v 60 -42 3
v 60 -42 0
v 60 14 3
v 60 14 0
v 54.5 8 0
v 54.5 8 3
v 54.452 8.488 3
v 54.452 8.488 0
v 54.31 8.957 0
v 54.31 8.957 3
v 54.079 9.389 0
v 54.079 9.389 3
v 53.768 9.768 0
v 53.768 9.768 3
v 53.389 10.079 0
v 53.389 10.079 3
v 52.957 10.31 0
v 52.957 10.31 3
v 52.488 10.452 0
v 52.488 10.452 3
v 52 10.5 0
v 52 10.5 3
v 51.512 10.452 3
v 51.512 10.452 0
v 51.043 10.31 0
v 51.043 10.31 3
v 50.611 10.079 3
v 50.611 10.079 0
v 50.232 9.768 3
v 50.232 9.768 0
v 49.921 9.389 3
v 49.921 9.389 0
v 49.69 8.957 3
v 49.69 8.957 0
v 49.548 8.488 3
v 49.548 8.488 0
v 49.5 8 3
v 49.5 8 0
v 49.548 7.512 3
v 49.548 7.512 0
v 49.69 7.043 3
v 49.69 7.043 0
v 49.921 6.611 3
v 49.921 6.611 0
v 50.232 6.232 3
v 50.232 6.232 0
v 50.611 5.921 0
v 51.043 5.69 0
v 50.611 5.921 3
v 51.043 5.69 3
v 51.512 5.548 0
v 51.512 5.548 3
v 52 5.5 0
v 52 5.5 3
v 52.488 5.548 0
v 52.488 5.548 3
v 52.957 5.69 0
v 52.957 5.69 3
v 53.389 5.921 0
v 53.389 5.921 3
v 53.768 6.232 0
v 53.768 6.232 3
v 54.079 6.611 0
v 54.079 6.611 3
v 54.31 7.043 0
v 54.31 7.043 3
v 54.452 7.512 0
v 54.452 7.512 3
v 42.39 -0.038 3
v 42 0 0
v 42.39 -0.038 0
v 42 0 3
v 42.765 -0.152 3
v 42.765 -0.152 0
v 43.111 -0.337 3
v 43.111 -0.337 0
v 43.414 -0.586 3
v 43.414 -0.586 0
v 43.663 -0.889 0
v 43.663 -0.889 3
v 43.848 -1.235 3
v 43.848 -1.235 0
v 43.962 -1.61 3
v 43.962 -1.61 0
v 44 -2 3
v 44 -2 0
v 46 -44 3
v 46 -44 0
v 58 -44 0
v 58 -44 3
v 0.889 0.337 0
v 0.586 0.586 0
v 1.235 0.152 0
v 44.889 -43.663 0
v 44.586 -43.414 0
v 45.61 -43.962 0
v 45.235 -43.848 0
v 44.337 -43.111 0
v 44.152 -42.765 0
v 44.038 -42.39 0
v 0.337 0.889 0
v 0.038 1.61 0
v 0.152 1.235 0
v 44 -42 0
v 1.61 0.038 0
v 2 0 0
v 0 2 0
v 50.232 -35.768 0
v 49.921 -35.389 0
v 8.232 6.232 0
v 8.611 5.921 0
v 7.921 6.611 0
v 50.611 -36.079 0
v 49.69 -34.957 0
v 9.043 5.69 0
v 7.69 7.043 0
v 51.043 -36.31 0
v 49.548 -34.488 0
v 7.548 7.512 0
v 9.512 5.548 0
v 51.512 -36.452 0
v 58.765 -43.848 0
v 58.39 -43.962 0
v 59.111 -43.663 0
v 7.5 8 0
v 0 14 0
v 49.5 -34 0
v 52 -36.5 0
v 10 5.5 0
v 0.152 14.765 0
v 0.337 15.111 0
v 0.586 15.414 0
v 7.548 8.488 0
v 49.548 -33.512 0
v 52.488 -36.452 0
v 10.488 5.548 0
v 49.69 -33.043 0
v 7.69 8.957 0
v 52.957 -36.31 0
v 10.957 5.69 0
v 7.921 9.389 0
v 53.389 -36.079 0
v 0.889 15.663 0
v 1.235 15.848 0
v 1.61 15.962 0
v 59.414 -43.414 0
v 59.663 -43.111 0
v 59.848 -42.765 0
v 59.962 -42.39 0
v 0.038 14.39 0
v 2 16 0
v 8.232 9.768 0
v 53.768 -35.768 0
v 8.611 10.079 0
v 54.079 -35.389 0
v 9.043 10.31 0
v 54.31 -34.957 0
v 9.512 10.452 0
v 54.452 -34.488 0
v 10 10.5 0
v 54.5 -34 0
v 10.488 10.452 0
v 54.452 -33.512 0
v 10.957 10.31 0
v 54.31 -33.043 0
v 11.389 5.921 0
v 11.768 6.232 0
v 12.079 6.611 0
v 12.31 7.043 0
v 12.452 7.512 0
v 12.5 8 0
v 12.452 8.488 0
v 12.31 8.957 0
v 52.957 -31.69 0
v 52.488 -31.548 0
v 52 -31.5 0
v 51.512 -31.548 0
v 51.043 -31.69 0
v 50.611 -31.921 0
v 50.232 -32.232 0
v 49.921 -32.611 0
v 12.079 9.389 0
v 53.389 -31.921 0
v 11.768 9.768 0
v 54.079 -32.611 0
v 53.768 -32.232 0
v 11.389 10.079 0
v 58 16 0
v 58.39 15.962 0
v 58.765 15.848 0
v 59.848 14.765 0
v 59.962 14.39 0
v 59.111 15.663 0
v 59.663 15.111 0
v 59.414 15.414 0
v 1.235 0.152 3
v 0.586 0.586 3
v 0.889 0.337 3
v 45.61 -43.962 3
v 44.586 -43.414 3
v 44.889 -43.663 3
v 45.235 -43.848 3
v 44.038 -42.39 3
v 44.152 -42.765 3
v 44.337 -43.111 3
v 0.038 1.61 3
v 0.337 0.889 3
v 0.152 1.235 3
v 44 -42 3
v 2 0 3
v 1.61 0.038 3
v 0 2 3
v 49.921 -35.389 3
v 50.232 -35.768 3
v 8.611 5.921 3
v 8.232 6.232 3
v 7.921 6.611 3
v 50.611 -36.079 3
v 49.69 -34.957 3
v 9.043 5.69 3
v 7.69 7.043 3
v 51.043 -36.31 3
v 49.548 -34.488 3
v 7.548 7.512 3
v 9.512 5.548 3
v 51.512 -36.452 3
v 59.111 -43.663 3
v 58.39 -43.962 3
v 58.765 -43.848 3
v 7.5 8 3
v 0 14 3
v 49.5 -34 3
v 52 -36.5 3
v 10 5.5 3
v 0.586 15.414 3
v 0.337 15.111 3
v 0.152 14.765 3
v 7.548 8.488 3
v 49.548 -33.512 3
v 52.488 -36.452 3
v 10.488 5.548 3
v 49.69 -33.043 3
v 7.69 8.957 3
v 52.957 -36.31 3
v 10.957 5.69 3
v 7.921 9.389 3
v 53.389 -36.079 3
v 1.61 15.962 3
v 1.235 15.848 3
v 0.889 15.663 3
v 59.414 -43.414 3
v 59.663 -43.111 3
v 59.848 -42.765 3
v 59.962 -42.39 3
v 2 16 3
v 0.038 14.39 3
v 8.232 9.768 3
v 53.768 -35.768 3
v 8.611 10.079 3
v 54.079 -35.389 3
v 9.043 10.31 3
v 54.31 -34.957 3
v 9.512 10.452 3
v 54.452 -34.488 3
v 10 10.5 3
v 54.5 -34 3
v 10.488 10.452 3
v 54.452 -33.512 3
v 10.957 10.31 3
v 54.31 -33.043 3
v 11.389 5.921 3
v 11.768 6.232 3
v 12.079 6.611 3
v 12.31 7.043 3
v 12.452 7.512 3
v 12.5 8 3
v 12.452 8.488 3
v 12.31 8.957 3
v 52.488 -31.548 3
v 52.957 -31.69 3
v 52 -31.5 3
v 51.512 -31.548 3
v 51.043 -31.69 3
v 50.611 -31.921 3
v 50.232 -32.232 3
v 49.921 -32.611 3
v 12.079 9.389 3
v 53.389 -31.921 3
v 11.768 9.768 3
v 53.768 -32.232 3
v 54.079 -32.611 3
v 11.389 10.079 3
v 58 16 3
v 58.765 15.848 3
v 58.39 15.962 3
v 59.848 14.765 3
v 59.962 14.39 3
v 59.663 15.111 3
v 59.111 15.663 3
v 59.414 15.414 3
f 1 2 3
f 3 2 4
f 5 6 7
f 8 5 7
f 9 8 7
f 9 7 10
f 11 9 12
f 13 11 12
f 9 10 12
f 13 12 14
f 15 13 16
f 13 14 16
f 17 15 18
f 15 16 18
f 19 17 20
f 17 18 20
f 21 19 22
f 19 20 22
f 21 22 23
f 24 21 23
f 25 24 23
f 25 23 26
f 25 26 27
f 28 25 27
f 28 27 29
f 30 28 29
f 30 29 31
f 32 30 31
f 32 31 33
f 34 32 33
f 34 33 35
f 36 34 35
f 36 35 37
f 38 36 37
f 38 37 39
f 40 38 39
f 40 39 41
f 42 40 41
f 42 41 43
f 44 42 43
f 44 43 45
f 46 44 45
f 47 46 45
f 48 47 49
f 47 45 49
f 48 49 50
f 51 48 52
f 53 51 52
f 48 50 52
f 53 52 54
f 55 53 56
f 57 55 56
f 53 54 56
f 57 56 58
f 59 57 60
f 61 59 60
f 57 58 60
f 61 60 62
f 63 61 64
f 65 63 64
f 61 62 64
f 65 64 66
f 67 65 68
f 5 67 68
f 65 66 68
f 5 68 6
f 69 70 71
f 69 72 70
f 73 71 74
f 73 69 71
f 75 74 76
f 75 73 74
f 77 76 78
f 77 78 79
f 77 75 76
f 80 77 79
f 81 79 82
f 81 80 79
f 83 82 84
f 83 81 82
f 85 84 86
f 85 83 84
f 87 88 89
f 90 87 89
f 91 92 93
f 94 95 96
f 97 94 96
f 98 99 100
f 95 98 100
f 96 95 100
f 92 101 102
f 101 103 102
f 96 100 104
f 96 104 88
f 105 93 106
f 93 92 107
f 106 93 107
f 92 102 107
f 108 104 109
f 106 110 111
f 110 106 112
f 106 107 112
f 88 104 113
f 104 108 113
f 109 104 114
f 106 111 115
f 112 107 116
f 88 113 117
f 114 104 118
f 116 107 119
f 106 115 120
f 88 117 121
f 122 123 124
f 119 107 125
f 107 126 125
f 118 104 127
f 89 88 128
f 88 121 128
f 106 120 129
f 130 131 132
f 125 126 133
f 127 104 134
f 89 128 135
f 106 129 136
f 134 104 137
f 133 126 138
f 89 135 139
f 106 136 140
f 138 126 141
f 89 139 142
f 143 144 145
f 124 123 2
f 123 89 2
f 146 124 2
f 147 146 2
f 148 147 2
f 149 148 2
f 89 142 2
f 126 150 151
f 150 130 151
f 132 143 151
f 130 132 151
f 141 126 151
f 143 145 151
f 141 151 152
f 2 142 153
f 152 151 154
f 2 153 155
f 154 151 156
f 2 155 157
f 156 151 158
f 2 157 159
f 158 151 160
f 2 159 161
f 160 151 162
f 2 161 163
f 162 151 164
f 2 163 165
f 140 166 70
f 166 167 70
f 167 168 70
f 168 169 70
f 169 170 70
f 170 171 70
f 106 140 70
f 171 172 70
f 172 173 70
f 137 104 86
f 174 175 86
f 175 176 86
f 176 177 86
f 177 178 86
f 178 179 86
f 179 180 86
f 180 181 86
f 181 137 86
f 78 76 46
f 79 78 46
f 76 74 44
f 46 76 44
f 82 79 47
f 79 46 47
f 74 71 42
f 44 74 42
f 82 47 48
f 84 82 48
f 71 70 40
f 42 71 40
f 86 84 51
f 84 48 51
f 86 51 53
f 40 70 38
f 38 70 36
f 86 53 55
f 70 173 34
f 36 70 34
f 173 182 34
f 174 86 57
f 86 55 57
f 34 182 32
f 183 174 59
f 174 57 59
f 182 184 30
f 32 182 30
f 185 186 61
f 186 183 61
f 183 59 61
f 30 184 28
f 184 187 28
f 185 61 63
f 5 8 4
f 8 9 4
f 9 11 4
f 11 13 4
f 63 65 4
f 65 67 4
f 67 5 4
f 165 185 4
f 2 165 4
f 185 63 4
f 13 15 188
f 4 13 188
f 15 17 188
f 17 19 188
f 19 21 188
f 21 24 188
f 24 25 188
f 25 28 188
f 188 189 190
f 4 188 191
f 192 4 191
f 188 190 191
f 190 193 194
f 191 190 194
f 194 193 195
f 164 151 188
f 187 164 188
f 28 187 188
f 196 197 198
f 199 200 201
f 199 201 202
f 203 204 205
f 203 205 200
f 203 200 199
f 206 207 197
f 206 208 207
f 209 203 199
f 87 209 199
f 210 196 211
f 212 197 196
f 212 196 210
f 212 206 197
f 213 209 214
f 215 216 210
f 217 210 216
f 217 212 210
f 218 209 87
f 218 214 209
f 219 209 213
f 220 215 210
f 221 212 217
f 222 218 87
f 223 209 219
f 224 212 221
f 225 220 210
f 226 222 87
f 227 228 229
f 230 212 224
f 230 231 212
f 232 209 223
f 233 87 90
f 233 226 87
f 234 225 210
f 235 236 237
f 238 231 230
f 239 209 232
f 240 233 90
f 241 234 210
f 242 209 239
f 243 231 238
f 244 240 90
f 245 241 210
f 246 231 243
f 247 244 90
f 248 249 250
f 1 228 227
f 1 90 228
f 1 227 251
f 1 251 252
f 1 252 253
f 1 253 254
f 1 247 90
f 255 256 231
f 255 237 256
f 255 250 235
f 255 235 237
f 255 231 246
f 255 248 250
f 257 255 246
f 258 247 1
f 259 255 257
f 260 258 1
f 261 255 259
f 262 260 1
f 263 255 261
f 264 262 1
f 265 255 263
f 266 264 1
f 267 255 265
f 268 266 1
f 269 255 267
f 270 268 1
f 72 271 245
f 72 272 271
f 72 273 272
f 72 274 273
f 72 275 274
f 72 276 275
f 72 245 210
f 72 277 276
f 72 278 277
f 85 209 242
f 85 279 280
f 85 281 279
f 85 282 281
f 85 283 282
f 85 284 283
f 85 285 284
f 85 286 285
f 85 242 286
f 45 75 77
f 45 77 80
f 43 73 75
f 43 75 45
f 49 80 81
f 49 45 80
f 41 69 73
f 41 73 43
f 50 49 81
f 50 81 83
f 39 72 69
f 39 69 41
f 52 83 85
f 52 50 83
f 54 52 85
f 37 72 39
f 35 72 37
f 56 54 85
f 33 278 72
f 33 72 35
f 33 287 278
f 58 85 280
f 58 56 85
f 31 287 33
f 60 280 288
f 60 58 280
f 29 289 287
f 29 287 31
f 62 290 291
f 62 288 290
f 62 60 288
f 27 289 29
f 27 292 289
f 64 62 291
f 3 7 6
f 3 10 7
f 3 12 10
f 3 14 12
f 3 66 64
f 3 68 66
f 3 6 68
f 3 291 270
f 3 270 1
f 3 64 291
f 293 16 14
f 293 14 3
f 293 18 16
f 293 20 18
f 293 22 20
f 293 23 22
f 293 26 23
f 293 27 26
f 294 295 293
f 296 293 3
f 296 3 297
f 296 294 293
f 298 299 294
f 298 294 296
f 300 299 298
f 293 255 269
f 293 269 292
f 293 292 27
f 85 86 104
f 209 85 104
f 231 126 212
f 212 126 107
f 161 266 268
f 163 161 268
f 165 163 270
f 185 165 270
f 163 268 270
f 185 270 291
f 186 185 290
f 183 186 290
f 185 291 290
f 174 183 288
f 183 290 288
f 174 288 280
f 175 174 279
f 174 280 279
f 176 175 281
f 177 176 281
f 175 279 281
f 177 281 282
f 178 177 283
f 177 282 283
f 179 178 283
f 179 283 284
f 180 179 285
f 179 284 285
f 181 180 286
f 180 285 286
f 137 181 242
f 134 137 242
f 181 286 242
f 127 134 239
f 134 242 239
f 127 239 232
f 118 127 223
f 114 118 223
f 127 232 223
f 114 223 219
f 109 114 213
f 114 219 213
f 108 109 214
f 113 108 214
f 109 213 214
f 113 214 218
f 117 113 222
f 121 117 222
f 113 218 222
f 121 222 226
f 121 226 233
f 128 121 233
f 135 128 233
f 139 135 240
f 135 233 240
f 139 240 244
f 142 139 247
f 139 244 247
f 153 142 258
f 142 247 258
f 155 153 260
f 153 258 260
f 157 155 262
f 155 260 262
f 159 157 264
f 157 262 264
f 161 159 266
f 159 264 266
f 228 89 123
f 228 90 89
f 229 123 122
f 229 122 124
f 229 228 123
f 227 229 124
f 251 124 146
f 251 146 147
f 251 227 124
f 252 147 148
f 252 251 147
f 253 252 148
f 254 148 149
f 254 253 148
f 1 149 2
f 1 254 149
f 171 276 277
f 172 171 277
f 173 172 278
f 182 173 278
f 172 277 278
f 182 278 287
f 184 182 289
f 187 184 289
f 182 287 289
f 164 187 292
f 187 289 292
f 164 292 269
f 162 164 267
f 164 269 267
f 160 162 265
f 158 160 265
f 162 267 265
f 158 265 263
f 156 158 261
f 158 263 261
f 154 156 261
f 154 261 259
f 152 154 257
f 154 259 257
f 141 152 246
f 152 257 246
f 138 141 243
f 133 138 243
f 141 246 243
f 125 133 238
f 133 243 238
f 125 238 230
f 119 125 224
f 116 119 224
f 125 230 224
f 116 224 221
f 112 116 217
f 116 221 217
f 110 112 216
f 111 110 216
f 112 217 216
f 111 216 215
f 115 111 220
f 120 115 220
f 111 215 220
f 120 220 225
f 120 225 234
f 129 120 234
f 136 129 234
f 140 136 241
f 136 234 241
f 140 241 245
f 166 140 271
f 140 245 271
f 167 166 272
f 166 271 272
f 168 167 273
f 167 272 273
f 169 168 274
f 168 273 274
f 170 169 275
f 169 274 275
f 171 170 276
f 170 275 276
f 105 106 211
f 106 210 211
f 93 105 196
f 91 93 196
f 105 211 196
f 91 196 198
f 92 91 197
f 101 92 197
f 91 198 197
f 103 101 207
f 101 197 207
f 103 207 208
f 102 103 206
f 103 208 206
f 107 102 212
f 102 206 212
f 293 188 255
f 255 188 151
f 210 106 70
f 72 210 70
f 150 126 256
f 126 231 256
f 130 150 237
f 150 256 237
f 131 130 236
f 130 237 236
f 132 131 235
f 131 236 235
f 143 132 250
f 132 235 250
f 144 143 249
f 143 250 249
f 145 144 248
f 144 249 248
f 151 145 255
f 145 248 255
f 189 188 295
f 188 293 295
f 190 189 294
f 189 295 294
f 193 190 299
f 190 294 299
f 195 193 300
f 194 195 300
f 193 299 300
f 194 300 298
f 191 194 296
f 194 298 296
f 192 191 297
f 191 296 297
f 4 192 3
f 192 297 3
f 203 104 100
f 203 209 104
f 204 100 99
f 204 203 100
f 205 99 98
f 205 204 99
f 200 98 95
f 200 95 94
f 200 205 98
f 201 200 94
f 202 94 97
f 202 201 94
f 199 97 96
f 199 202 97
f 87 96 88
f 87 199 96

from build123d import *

# Parameters (mm, degrees)
BOSS_EXTRUDE1_DEPTH   = 3
SKETCH2_R             = 2.5
CUT_EXTRUDE1_DEPTH    = 3
FILLET1_R             = 2
F_5_0MM_DOWEL_HOLE1_D = 5


with BuildPart() as part:
    # Sketch1 → Boss-Extrude1 (new body)
    with BuildSketch(Plane.XY):
        Polygon((0, 0), (44, 0), (44, -44), (60, -44), (60, -15.656804173), (60, 16), (0, 16), align=None)
    extrude(amount=BOSS_EXTRUDE1_DEPTH)

    # Sketch2 → Cut-Extrude1 (cut)
    with BuildSketch(Plane.XY.offset(3)):
        with Locations((10, 8)):
            Circle(SKETCH2_R)
        with Locations((52, -34)):
            Circle(SKETCH2_R)
    extrude(amount=-CUT_EXTRUDE1_DEPTH, mode=Mode.SUBTRACT)

    # Fillet1
    fillet1_edges = [part.edges().sort_by_distance(p)[0] for p in [
        (0, 16, 1.5),
        (60, 16, 1.5),
        (60, -44, 1.5),
        (44, -44, 1.5),
        (44, 0, 1.5),
        (0, 0, 1.5),
    ]]
    fillet(fillet1_edges, radius=FILLET1_R)

    # Ø5.0mm Dowel Hole1 (through all)
    with Locations(Plane(origin=(0, 0, 0), x_dir=(-1, 0, 0), z_dir=(0, 0, -1))):
        with Locations((-52, 8)):
            Hole(F_5_0MM_DOWEL_HOLE1_D / 2)


solid = part.part
